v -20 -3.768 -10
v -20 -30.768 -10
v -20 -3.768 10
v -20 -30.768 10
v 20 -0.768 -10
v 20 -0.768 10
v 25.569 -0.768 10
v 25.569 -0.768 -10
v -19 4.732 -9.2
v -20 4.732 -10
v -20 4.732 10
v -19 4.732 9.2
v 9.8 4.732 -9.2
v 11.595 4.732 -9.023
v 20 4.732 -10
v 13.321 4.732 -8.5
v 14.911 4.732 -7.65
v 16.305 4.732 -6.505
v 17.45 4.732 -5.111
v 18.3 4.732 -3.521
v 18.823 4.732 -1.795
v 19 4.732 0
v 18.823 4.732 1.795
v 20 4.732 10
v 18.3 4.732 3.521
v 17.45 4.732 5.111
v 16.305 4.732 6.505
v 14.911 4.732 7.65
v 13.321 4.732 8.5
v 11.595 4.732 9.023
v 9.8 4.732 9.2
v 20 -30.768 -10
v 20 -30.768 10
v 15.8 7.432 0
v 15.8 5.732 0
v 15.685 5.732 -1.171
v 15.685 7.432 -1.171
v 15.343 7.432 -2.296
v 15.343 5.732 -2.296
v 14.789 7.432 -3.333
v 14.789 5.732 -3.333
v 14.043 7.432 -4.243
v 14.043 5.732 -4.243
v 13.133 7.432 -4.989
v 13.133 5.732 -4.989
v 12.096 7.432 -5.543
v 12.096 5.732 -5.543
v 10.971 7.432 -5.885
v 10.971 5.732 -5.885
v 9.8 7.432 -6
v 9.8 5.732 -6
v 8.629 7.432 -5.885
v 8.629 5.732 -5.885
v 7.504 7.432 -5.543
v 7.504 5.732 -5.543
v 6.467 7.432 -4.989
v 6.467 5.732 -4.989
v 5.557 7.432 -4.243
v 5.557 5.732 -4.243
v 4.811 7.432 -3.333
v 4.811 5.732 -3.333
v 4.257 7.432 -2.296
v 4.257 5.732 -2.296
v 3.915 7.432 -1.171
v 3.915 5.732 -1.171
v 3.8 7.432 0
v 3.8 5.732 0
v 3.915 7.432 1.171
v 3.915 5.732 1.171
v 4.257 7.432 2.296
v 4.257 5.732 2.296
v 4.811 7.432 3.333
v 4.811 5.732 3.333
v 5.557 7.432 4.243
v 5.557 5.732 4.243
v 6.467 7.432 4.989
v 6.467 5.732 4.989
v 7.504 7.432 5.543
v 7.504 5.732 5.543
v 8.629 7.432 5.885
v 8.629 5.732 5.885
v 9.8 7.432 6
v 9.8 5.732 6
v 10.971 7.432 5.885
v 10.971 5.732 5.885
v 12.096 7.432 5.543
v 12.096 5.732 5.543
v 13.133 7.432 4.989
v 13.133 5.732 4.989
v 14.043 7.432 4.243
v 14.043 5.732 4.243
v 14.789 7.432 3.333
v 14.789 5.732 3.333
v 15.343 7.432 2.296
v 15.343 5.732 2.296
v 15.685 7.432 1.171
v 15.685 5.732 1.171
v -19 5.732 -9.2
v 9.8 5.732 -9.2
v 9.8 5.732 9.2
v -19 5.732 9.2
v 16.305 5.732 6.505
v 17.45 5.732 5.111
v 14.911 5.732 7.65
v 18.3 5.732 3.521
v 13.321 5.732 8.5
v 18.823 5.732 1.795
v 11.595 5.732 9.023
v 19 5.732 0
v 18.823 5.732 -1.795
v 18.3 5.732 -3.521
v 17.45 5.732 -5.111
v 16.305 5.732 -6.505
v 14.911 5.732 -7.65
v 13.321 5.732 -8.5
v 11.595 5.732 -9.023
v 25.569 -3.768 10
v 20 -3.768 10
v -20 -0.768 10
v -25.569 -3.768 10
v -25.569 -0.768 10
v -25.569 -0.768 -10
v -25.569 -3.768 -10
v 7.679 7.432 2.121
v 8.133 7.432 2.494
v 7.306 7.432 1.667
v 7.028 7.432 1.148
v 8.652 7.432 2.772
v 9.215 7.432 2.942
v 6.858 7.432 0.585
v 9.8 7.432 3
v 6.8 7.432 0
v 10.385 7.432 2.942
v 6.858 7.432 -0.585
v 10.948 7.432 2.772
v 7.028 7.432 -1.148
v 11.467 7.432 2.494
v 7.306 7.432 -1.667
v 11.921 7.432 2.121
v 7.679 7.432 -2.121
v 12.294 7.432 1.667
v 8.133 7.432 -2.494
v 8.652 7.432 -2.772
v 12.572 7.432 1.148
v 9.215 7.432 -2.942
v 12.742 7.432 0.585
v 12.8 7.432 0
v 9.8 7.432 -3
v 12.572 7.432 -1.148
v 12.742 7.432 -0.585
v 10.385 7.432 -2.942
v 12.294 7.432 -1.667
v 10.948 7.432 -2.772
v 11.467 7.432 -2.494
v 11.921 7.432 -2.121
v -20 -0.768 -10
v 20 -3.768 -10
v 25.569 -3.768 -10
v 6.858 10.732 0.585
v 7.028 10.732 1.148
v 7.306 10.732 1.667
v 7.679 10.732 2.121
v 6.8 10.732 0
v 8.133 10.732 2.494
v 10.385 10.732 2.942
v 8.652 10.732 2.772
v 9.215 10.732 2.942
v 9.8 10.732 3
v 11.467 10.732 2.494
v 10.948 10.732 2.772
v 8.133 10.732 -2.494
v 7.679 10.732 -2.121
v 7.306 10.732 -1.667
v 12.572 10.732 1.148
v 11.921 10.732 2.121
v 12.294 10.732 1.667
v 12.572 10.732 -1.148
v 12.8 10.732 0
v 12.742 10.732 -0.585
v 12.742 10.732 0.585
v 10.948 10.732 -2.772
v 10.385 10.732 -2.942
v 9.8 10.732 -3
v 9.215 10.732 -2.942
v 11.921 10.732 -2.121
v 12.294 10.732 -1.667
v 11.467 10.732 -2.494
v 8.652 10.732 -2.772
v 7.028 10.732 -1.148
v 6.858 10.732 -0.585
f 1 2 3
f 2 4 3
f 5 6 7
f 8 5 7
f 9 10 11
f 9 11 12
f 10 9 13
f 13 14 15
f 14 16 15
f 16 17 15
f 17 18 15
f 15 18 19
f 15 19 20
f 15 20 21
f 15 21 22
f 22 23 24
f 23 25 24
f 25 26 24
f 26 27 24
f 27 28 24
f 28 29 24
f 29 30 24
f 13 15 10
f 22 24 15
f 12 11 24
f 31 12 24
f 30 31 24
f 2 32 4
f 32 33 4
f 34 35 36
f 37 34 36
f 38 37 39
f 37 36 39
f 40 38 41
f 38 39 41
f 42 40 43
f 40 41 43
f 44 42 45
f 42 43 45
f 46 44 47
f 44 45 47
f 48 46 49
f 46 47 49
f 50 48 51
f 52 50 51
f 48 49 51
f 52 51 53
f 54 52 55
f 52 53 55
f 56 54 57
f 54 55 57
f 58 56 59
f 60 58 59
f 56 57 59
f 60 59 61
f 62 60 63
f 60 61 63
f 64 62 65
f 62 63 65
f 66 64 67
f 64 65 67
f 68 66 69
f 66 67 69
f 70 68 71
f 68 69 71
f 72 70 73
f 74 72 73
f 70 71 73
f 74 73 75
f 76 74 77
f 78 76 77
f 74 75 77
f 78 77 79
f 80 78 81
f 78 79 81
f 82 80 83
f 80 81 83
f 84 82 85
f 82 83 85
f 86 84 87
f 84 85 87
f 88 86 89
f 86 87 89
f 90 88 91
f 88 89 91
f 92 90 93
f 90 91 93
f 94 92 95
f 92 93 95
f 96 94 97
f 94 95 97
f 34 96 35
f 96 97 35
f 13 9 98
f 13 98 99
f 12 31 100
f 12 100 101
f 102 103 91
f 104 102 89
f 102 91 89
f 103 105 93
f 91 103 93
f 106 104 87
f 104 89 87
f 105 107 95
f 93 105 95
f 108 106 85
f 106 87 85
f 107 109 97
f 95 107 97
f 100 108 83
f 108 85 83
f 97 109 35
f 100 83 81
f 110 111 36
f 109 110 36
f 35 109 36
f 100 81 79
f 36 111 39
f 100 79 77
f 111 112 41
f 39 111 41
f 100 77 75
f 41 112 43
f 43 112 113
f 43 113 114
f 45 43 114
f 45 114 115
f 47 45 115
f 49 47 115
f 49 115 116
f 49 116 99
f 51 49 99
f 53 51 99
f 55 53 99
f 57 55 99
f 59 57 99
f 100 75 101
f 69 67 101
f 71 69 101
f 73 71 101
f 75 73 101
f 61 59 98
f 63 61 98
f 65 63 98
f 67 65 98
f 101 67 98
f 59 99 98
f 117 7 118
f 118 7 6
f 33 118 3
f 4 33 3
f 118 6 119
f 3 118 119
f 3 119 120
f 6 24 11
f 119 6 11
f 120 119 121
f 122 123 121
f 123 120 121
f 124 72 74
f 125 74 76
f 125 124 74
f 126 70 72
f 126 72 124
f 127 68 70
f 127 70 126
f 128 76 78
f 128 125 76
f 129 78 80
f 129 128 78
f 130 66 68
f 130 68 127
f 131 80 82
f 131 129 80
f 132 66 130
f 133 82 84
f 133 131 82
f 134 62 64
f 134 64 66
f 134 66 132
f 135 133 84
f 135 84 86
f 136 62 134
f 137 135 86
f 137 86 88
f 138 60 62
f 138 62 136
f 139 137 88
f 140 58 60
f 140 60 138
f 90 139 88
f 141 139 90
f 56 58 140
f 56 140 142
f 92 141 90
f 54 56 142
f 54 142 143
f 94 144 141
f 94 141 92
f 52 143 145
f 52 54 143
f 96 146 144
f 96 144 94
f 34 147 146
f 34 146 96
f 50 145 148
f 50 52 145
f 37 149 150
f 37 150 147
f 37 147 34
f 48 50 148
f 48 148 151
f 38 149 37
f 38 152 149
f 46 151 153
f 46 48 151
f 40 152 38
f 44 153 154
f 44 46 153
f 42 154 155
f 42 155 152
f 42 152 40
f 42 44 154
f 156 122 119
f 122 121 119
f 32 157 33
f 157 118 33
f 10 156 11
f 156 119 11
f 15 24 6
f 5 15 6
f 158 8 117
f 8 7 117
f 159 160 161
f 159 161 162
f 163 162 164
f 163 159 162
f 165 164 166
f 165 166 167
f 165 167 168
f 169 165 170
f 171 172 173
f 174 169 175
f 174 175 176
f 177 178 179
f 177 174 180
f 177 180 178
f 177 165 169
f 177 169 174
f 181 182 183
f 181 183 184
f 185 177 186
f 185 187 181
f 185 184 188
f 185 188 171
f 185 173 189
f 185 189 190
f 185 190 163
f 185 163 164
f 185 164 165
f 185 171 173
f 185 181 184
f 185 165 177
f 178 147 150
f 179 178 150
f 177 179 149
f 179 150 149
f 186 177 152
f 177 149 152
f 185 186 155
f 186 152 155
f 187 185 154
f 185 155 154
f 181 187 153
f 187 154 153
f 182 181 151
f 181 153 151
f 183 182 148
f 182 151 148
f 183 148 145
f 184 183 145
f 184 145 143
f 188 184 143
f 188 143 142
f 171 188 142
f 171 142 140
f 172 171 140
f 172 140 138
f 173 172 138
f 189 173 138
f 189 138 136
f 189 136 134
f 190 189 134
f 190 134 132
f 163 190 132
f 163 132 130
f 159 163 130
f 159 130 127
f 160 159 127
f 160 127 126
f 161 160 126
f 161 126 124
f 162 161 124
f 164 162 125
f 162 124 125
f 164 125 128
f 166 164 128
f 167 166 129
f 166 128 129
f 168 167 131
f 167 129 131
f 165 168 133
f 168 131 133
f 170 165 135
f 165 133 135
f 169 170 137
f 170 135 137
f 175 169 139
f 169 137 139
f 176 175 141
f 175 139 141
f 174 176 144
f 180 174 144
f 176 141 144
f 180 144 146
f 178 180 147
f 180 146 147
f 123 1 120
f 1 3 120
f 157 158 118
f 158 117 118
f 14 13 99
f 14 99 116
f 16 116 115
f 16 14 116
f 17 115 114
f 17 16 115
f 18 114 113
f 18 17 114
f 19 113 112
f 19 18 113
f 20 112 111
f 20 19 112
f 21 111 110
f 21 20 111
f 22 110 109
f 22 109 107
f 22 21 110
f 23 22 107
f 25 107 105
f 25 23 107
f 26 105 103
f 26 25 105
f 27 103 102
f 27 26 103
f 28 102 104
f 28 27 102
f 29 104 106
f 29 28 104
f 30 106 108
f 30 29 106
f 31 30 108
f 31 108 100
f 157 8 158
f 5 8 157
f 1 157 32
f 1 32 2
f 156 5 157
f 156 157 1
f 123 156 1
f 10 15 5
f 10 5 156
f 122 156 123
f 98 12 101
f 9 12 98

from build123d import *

# Parameters (mm, degrees)
RESSALTO_EXTRUS_O1_DEPTH = 10
RESSALTO_EXTRUS_O2_DEPTH = 1
ESBO_O4_R                = 3
RESSALTO_EXTRUS_O3_DEPTH = 5
ESBO_O5_R                = 6
RESSALTO_EXTRUS_O4_DEPTH = 1.7


with BuildPart() as part:
    # Esboço1 → Ressalto-extrusão1 (new body, symmetric)
    with BuildSketch(Plane.XY):
        Polygon((20, -0.767915455), (25.568877633, -0.767915455), (25.568877633, -3.767915455), (20, -3.767915455), (20, -30.767915455), (-20, -30.767915455), (-20, -3.767915455), (-25.568877633, -3.767915455), (-25.568877633, -0.767915455), (-20, -0.767915455), (-20, 4.732084545), (20, 4.732084545), align=None)
    extrude(amount=RESSALTO_EXTRUS_O1_DEPTH, both=True)

    # Esboço3 → Ressalto-extrusão2 (add)
    with BuildSketch(Plane(origin=(0, 4.732084545, 0), x_dir=(1, 0, 0), z_dir=(0, 1, 0))):
        with BuildLine():
            Line((-19, 9.2), (9.8, 9.2))
            ThreePointArc((9.8, 9.2), (19, 0), (9.8, -9.2))
            Line((9.8, -9.2), (-19, -9.2))
            Line((-19, -9.2), (-19, 9.2))
        make_face()
    extrude(amount=RESSALTO_EXTRUS_O2_DEPTH)

    # Esboço4 → Ressalto-extrusão3 (add)
    with BuildSketch(Plane(origin=(0, 5.732084545, 0), x_dir=(1, 0, 0), z_dir=(0, 1, 0))):
        with Locations((9.8, 0)):
            Circle(ESBO_O4_R)
    extrude(amount=RESSALTO_EXTRUS_O3_DEPTH)

    # Esboço5 → Ressalto-extrusão4 (add)
    with BuildSketch(Plane(origin=(0, 5.732084545, 0), x_dir=(1, 0, 0), z_dir=(0, 1, 0))):
        with Locations((9.8, 0)):
            Circle(ESBO_O5_R)
    extrude(amount=RESSALTO_EXTRUS_O4_DEPTH)


solid = part.part
